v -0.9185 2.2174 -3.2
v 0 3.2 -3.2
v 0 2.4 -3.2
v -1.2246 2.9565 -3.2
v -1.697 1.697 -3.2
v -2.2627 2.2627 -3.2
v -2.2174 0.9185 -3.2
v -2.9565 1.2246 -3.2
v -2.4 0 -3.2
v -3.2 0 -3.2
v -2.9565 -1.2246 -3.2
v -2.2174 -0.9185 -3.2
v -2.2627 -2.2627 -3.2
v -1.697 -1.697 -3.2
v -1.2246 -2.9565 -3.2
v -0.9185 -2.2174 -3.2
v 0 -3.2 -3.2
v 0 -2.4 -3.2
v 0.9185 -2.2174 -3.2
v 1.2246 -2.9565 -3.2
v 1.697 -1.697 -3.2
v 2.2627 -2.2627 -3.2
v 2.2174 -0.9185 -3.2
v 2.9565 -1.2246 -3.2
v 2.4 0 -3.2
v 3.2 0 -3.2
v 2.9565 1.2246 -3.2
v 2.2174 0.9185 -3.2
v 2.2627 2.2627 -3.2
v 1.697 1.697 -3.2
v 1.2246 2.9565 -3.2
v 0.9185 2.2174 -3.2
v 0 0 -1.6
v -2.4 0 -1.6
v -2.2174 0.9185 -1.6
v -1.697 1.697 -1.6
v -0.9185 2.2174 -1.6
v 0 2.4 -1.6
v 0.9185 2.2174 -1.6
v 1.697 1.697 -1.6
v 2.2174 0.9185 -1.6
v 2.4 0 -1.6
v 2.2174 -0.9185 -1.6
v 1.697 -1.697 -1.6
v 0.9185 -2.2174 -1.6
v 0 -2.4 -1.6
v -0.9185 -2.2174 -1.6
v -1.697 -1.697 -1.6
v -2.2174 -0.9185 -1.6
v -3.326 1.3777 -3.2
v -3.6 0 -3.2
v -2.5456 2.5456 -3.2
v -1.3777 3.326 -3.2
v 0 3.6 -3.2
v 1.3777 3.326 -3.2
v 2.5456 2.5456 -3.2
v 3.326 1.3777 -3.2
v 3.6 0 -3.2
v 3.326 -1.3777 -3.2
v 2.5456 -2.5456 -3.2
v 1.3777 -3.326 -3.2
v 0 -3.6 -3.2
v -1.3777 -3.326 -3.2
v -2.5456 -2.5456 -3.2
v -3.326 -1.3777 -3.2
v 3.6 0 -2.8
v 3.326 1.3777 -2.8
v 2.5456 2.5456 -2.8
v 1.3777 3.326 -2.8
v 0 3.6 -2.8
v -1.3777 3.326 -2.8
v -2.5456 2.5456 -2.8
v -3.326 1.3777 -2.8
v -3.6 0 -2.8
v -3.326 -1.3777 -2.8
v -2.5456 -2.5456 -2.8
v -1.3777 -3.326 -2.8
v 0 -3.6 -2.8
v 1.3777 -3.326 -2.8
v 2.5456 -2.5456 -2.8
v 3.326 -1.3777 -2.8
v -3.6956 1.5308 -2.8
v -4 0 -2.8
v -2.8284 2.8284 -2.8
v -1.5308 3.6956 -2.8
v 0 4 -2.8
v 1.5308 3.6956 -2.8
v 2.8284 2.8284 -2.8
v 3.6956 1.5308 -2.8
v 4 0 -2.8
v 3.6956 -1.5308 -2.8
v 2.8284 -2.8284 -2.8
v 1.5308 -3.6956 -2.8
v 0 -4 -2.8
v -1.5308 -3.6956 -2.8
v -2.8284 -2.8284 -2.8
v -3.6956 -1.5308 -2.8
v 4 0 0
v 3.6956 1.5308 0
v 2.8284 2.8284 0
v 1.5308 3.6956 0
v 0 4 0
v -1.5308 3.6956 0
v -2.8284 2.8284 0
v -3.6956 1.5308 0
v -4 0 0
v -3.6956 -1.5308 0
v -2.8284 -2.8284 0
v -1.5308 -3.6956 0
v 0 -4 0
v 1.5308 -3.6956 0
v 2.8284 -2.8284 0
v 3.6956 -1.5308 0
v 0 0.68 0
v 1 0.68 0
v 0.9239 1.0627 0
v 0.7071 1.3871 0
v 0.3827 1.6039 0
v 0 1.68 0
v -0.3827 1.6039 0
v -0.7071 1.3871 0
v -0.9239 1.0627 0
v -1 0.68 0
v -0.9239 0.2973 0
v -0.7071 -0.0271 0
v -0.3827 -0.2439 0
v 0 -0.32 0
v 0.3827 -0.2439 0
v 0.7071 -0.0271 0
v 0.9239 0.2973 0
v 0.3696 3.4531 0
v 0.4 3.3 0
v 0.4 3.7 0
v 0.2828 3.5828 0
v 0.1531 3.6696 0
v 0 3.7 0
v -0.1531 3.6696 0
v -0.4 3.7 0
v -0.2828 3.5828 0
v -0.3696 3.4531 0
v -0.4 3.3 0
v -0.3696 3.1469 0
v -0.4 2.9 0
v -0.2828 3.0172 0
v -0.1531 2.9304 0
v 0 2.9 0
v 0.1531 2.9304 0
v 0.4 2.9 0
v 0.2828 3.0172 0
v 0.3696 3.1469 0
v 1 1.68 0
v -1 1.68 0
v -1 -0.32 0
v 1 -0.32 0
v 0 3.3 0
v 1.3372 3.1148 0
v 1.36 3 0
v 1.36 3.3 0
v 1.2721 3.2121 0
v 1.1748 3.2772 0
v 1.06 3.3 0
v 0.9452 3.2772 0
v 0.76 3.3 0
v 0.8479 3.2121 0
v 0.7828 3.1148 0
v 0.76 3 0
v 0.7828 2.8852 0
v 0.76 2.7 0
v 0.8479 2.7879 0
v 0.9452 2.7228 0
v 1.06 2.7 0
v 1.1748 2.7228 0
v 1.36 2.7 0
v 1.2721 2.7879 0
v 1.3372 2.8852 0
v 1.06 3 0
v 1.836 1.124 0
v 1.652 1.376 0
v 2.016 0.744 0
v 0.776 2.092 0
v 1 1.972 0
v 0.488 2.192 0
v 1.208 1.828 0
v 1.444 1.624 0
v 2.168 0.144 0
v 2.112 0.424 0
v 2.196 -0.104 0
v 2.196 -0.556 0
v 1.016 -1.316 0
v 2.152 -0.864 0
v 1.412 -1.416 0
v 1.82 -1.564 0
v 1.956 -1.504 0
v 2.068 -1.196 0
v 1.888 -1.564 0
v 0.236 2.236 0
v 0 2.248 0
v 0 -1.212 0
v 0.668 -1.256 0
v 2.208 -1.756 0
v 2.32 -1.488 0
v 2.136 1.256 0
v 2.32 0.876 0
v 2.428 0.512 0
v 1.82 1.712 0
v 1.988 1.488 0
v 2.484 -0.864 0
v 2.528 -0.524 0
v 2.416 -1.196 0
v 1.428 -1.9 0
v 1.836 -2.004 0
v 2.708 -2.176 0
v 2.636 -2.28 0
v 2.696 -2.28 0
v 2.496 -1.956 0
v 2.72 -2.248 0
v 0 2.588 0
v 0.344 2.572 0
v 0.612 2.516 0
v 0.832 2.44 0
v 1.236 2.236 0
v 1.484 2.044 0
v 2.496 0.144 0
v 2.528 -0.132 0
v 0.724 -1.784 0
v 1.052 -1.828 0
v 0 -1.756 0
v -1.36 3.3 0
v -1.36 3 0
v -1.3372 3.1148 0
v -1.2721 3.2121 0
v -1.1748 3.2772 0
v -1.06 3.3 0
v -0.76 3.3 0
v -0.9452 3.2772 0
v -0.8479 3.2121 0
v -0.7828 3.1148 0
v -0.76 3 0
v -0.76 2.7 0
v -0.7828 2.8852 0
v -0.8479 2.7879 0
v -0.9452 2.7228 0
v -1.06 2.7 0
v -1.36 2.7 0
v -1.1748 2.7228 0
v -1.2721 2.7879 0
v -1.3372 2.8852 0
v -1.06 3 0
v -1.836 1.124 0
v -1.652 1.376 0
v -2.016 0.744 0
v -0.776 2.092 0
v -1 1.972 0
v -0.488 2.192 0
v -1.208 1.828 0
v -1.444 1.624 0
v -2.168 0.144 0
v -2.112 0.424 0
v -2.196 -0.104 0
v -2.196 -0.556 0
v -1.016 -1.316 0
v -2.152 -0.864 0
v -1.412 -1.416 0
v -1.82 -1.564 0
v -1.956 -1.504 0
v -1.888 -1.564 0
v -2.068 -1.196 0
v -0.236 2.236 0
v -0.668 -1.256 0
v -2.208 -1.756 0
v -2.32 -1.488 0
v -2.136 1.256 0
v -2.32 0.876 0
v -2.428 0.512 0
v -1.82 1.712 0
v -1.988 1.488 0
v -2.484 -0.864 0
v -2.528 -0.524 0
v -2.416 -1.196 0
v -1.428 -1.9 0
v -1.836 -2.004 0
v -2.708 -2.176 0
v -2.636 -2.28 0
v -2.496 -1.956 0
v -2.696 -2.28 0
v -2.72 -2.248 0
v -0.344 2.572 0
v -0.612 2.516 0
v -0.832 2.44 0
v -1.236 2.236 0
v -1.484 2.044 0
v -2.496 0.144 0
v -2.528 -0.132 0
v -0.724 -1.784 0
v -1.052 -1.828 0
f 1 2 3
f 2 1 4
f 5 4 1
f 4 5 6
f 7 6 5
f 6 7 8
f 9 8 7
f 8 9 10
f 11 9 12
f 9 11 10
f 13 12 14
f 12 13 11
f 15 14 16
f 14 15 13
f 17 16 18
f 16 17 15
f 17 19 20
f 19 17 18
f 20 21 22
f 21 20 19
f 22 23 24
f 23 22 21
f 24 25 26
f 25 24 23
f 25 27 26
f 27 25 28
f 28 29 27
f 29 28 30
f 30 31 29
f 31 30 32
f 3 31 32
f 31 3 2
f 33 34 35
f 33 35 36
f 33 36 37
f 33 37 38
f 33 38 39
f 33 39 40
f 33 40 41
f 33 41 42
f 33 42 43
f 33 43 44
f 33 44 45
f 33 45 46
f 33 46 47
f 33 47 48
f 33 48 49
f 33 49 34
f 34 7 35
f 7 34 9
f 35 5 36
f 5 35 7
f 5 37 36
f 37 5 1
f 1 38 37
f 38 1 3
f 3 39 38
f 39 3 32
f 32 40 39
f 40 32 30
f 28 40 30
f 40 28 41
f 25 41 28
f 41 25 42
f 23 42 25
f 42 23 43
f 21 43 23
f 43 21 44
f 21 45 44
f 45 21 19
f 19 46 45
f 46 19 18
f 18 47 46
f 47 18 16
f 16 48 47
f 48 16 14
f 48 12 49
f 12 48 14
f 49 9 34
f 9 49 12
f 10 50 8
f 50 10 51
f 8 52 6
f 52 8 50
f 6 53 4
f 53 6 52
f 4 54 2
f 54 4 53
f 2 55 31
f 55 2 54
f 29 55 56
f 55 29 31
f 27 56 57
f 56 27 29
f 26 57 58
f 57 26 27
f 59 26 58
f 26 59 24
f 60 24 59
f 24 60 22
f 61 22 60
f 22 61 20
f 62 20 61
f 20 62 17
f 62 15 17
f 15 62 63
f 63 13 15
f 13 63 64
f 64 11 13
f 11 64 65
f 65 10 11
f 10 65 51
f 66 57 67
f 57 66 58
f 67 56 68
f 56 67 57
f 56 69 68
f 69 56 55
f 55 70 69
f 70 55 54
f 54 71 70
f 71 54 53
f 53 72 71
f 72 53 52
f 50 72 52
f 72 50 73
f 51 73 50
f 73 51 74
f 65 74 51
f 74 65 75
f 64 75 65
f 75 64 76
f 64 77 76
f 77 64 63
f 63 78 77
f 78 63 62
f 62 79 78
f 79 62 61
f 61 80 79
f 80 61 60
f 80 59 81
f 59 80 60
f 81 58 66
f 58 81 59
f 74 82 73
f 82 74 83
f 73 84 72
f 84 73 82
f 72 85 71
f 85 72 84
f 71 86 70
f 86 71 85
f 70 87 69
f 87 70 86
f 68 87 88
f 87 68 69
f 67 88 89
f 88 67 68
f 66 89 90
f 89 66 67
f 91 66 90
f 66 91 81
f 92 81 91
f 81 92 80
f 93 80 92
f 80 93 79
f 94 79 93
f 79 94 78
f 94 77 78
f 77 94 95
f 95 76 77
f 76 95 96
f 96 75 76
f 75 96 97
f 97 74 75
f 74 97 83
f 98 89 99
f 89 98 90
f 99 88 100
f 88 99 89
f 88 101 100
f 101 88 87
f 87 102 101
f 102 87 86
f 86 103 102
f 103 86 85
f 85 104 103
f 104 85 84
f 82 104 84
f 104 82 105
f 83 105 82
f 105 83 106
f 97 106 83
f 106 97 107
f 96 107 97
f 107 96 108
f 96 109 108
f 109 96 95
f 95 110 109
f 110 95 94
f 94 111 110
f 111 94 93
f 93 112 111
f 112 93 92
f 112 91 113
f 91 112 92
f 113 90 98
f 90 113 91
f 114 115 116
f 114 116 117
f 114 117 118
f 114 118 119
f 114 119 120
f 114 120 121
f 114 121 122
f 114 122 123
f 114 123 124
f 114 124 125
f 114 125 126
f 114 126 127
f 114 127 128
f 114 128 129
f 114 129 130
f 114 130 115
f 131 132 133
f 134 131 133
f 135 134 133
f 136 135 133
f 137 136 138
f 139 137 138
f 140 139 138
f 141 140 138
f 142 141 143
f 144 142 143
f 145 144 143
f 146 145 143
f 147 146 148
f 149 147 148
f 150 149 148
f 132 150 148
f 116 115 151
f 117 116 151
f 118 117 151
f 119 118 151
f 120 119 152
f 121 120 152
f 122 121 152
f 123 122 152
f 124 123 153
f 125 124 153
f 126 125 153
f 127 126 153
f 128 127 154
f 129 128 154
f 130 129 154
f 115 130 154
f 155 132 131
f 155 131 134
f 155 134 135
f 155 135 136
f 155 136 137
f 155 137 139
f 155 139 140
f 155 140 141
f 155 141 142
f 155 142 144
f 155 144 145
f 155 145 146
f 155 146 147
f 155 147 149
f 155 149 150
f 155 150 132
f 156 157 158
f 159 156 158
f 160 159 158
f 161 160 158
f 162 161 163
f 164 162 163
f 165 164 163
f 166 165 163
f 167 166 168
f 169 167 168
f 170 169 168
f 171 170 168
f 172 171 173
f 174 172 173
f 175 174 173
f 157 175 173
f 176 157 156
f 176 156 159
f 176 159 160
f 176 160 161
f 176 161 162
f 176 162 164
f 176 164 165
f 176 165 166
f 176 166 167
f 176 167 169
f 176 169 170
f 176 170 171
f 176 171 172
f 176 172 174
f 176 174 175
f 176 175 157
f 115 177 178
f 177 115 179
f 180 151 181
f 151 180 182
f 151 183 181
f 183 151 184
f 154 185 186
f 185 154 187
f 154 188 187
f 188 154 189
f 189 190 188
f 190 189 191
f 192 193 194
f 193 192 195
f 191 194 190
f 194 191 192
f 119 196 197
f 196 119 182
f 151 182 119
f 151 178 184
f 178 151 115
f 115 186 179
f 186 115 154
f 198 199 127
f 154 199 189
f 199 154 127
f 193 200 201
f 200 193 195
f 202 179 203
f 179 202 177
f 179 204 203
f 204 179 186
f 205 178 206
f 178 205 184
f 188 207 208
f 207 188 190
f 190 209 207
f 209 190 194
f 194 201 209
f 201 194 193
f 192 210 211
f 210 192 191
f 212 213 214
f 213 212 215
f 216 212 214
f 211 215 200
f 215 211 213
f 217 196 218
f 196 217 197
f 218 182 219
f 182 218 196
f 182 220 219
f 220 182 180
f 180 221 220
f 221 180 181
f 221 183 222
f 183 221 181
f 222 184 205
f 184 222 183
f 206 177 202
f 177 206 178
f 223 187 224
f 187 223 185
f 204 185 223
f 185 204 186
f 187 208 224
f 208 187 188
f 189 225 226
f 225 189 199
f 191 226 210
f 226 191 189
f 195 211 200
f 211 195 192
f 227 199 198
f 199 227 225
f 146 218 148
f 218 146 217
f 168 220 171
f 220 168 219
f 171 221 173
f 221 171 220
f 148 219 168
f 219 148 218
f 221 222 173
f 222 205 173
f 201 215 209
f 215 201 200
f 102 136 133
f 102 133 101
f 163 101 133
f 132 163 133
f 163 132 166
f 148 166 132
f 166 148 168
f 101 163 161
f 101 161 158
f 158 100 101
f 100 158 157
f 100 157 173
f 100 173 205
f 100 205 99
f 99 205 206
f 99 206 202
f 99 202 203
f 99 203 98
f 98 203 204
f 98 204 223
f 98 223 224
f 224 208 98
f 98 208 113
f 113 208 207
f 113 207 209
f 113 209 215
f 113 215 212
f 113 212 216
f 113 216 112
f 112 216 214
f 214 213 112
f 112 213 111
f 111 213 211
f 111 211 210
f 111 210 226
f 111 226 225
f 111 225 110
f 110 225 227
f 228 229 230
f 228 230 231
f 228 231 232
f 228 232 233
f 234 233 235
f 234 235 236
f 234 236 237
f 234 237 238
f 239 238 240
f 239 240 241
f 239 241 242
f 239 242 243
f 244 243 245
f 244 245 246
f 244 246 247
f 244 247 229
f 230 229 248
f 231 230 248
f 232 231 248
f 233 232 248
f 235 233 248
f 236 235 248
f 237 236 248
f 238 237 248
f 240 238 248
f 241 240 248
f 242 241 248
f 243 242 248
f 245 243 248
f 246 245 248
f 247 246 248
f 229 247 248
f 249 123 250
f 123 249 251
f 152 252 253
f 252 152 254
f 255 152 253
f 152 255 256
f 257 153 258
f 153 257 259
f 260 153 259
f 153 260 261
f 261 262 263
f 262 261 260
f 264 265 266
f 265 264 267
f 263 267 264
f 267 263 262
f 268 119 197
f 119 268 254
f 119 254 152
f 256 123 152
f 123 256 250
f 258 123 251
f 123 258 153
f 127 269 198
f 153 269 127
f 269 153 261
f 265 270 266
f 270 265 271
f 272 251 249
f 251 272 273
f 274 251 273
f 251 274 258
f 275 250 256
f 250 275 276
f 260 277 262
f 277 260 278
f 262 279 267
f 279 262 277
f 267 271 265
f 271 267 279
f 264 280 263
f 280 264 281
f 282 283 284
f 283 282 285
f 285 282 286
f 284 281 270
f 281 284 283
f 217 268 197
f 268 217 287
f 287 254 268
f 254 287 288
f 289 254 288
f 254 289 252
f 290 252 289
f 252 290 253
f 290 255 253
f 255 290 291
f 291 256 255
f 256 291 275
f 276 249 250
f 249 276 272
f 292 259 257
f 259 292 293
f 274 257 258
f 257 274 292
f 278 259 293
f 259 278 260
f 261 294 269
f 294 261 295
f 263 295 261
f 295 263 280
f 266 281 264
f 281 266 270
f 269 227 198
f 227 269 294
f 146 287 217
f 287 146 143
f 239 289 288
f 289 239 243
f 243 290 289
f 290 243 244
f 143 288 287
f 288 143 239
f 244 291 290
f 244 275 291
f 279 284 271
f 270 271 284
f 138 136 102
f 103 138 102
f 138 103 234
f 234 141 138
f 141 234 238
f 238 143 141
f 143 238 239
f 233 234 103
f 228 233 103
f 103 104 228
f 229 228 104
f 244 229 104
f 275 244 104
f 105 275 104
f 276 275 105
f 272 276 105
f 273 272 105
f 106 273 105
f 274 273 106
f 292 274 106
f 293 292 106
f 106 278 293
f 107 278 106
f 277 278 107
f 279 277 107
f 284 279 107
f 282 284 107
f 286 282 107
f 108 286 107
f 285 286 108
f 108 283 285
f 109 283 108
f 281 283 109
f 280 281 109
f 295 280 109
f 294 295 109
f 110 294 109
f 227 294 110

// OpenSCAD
// file: ../p/4-4ring3.scad
use <../lib.scad>
function ldraw_lib__4_4ring3() = [
// 0 Ring  3 x 1.0
// 0 Name: 4-4ring3.dat
// 0 Author: James Jessiman
// 0 !LDRAW_ORG Primitive UPDATE 2009-01
// 0 !LICENSE Licensed under CC BY 4.0 : see CAreadme.txt
// 
// 0 BFC CERTIFY CCW
  [0,"BFC","CERTIFY"],
  [0,"BFC","CCW"],
// 
// 0 !HISTORY 1998-12-15 [PTadmin] Official Update 1998-10
// 0 !HISTORY 2002-04-05 [hafhead] Added BFC statement
// 0 !HISTORY 2002-04-25 [PTadmin] Official Update 2002-02
// 0 !HISTORY 2007-06-24 [PTadmin] Header formatted for Contributor Agreement
// 0 !HISTORY 2008-07-01 [PTadmin] Official Update 2008-01
// 0 !HISTORY 2008-08-26 [cwdee] Switch polygon winding and rename
// 0 !HISTORY 2009-05-02 [PTadmin] Official Update 2009-01
// 
// 
// 4 16 -1.5308 0 3.6956 -1.1481 0 2.7717 0 0 3 0 0 4
  [4,16,-1.5308,0,3.6956,-1.1481,0,2.7717,0,0,3,0,0,4],
// 4 16 -2.8284 0 2.8284 -2.1213 0 2.1213 -1.1481 0 2.7717 -1.5308 0 3.6956
  [4,16,-2.8284,0,2.8284,-2.1213,0,2.1213,-1.1481,0,2.7717,-1.5308,0,3.6956],
// 4 16 -3.6956 0 1.5308 -2.7717 0 1.1481 -2.1213 0 2.1213 -2.8284 0 2.8284
  [4,16,-3.6956,0,1.5308,-2.7717,0,1.1481,-2.1213,0,2.1213,-2.8284,0,2.8284],
// 4 16 -4 0 0 -3 0 0 -2.7717 0 1.1481 -3.6956 0 1.5308
  [4,16,-4,0,0,-3,0,0,-2.7717,0,1.1481,-3.6956,0,1.5308],
// 4 16 -3.6956 0 -1.5308 -2.7717 0 -1.1481 -3 0 0 -4 0 0
  [4,16,-3.6956,0,-1.5308,-2.7717,0,-1.1481,-3,0,0,-4,0,0],
// 4 16 -2.8284 0 -2.8284 -2.1213 0 -2.1213 -2.7717 0 -1.1481 -3.6956 0 -1.5308
  [4,16,-2.8284,0,-2.8284,-2.1213,0,-2.1213,-2.7717,0,-1.1481,-3.6956,0,-1.5308],
// 4 16 -1.5308 0 -3.6956 -1.1481 0 -2.7717 -2.1213 0 -2.1213 -2.8284 0 -2.8284
  [4,16,-1.5308,0,-3.6956,-1.1481,0,-2.7717,-2.1213,0,-2.1213,-2.8284,0,-2.8284],
// 4 16 0 0 -4 0 0 -3 -1.1481 0 -2.7717 -1.5308 0 -3.6956
  [4,16,0,0,-4,0,0,-3,-1.1481,0,-2.7717,-1.5308,0,-3.6956],
// 4 16 1.5308 0 -3.6956 1.1481 0 -2.7717 0 0 -3 0 0 -4
  [4,16,1.5308,0,-3.6956,1.1481,0,-2.7717,0,0,-3,0,0,-4],
// 4 16 2.8284 0 -2.8284 2.1213 0 -2.1213 1.1481 0 -2.7717 1.5308 0 -3.6956
  [4,16,2.8284,0,-2.8284,2.1213,0,-2.1213,1.1481,0,-2.7717,1.5308,0,-3.6956],
// 4 16 3.6956 0 -1.5308 2.7717 0 -1.1481 2.1213 0 -2.1213 2.8284 0 -2.8284
  [4,16,3.6956,0,-1.5308,2.7717,0,-1.1481,2.1213,0,-2.1213,2.8284,0,-2.8284],
// 4 16 4 0 0 3 0 0 2.7717 0 -1.1481 3.6956 0 -1.5308
  [4,16,4,0,0,3,0,0,2.7717,0,-1.1481,3.6956,0,-1.5308],
// 4 16 3.6956 0 1.5308 2.7717 0 1.1481 3 0 0 4 0 0
  [4,16,3.6956,0,1.5308,2.7717,0,1.1481,3,0,0,4,0,0],
// 4 16 2.8284 0 2.8284 2.1213 0 2.1213 2.7717 0 1.1481 3.6956 0 1.5308
  [4,16,2.8284,0,2.8284,2.1213,0,2.1213,2.7717,0,1.1481,3.6956,0,1.5308],
// 4 16 1.5308 0 3.6956 1.1481 0 2.7717 2.1213 0 2.1213 2.8284 0 2.8284
  [4,16,1.5308,0,3.6956,1.1481,0,2.7717,2.1213,0,2.1213,2.8284,0,2.8284],
// 4 16 0 0 4 0 0 3 1.1481 0 2.7717 1.5308 0 3.6956
  [4,16,0,0,4,0,0,3,1.1481,0,2.7717,1.5308,0,3.6956],
// 0
];
module ldraw_lib__4_4ring3(step=0, col=false, unit=2/5, alt=false, line=0.2, solid=!$preview)
    makepoly(ldraw_lib__4_4ring3(), step=step, col=col, unit=unit, alt=alt, line=line, solid=solid);
ldraw_lib__4_4ring3(line=0.2);
// file: ../p/4-4cylc.scad
use <../lib.scad>
use <4-4cyli.scad>
use <4-4disc.scad>
use <4-4edge.scad>
function ldraw_lib__4_4cylc() = [
// 0 Cylinder Closed 1.0
// 0 Name: 4-4cylc.dat
// 0 Author: Alex Taylor [anathema]
// 0 !LDRAW_ORG Primitive UPDATE 2009-02
// 0 !LICENSE Licensed under CC BY 4.0 : see CAreadme.txt
// 
// 0 BFC CERTIFY CCW
  [0,"BFC","CERTIFY"],
  [0,"BFC","CCW"],
// 
// 0 !HISTORY 2008-12-29 [cwdee] Removed one disc
// 0 !HISTORY 2009-09-03 [PTadmin] Official Update 2009-02
// 
// 
// 1 16 0 0 0 1 0 0 0 1 0 0 0 1 4-4edge.dat
  [1,16,0,0,0,1,0,0,0,1,0,0,0,1, ldraw_lib__4_4edge()],
// 1 16 0 1 0 1 0 0 0 1 0 0 0 1 4-4edge.dat
  [1,16,0,1,0,1,0,0,0,1,0,0,0,1, ldraw_lib__4_4edge()],
// 1 16 0 0 0 1 0 0 0 1 0 0 0 1 4-4disc.dat
  [1,16,0,0,0,1,0,0,0,1,0,0,0,1, ldraw_lib__4_4disc()],
// 1 16 0 0 0 1 0 0 0 1 0 0 0 1 4-4cyli.dat
  [1,16,0,0,0,1,0,0,0,1,0,0,0,1, ldraw_lib__4_4cyli()],
// 0
];
module ldraw_lib__4_4cylc(step=0, col=false, unit=2/5, alt=false, line=0.2, solid=!$preview)
    makepoly(ldraw_lib__4_4cylc(), step=step, col=col, unit=unit, alt=alt, line=line, solid=solid);
ldraw_lib__4_4cylc(line=0.2);
// file: ../p/4-4edge.scad
use <../lib.scad>
function ldraw_lib__4_4edge() = [
// 0 Circle 1.0
// 0 Name: 4-4edge.dat
// 0 Author: James Jessiman
// 0 !LDRAW_ORG Primitive UPDATE 2017-01
// 0 !LICENSE Licensed under CC BY 4.0 : see CAreadme.txt
// 
// 0 BFC CERTIFY CCW
  [0,"BFC","CERTIFY"],
  [0,"BFC","CCW"],
// 
// 0 !HISTORY 1998-12-15 [PTadmin] Official Update 1998-10
// 0 !HISTORY 2005-12-28 [PTadmin] Official Update 2005-01
// 0 !HISTORY 2007-06-24 [PTadmin] Header formatted for Contributor Agreement
// 0 !HISTORY 2008-07-01 [PTadmin] Official Update 2008-01
// 0 !HISTORY 2017-01-15 [Steffen] BFCed
// 0 !HISTORY 2017-12-30 [PTadmin] Official Update 2017-01
// 
// 
// 2 24 1 0 0 0.9239 0 0.3827
  [2,24,1,0,0,0.9239,0,0.3827],
// 2 24 0.9239 0 0.3827 0.7071 0 0.7071
  [2,24,0.9239,0,0.3827,0.7071,0,0.7071],
// 2 24 0.7071 0 0.7071 0.3827 0 0.9239
  [2,24,0.7071,0,0.7071,0.3827,0,0.9239],
// 2 24 0.3827 0 0.9239 0 0 1
  [2,24,0.3827,0,0.9239,0,0,1],
// 2 24 0 0 1 -0.3827 0 0.9239
  [2,24,0,0,1,-0.3827,0,0.9239],
// 2 24 -0.3827 0 0.9239 -0.7071 0 0.7071
  [2,24,-0.3827,0,0.9239,-0.7071,0,0.7071],
// 2 24 -0.7071 0 0.7071 -0.9239 0 0.3827
  [2,24,-0.7071,0,0.7071,-0.9239,0,0.3827],
// 2 24 -0.9239 0 0.3827 -1 0 -0
  [2,24,-0.9239,0,0.3827,-1,0,-0],
// 2 24 -1 0 -0 -0.9239 0 -0.3827
  [2,24,-1,0,-0,-0.9239,0,-0.3827],
// 2 24 -0.9239 0 -0.3827 -0.7071 0 -0.7071
  [2,24,-0.9239,0,-0.3827,-0.7071,0,-0.7071],
// 2 24 -0.7071 0 -0.7071 -0.3827 0 -0.9239
  [2,24,-0.7071,0,-0.7071,-0.3827,0,-0.9239],
// 2 24 -0.3827 0 -0.9239 0 0 -1
  [2,24,-0.3827,0,-0.9239,0,0,-1],
// 2 24 0 0 -1 0.3827 0 -0.9239
  [2,24,0,0,-1,0.3827,0,-0.9239],
// 2 24 0.3827 0 -0.9239 0.7071 0 -0.7071
  [2,24,0.3827,0,-0.9239,0.7071,0,-0.7071],
// 2 24 0.7071 0 -0.7071 0.9239 0 -0.3827
  [2,24,0.7071,0,-0.7071,0.9239,0,-0.3827],
// 2 24 0.9239 0 -0.3827 1 0 0
  [2,24,0.9239,0,-0.3827,1,0,0],
];
module ldraw_lib__4_4edge(step=0, col=false, unit=2/5, alt=false, line=0.2, solid=!$preview)
    makepoly(ldraw_lib__4_4edge(), step=step, col=col, unit=unit, alt=alt, line=line, solid=solid);
ldraw_lib__4_4edge(line=0.2);
// file: ../p/4-4cyli.scad
use <../lib.scad>
function ldraw_lib__4_4cyli() = [
// 0 Cylinder 1.0
// 0 Name: 4-4cyli.dat
// 0 Author: James Jessiman
// 0 !LDRAW_ORG Primitive UPDATE 2005-01
// 0 !LICENSE Licensed under CC BY 4.0 : see CAreadme.txt
// 
// 0 BFC CERTIFY CCW
  [0,"BFC","CERTIFY"],
  [0,"BFC","CCW"],
// 
// 0 !HISTORY 1998-12-15 [PTadmin] Official Update 1998-10
// 0 !HISTORY 2002-03-23 [sbliss] Added BFC statement; merged headers from files in distributions LDraw 0.27 and Complete.
// 0 !HISTORY 2002-04-25 [PTadmin] Official Update 2002-02
// 0 !HISTORY 2004-12-14 [guyvivan] BFC CCW
// 0 !HISTORY 2005-12-28 [PTadmin] Official Update 2005-01
// 0 !HISTORY 2007-06-24 [PTadmin] Header formatted for Contributor Agreement
// 0 !HISTORY 2008-07-01 [PTadmin] Official Update 2008-01
// 
// 
// 4 16 1 1 0 0.9239 1 0.3827 0.9239 0 0.3827 1 0 0
  [4,16,1,1,0,0.9239,1,0.3827,0.9239,0,0.3827,1,0,0],
// 5 24 1 0 0 1 1 0 0.9239 0 0.3827 0.9239 0 -0.3827
  [5,24,1,0,0,1,1,0,0.9239,0,0.3827,0.9239,0,-0.3827],
// 4 16 0.9239 1 0.3827 0.7071 1 0.7071 0.7071 0 0.7071 0.9239 0 0.3827
  [4,16,0.9239,1,0.3827,0.7071,1,0.7071,0.7071,0,0.7071,0.9239,0,0.3827],
// 5 24 0.9239 0 0.3827 0.9239 1 0.3827 0.7071 0 0.7071 1 0 0
  [5,24,0.9239,0,0.3827,0.9239,1,0.3827,0.7071,0,0.7071,1,0,0],
// 4 16 0.7071 1 0.7071 0.3827 1 0.9239 0.3827 0 0.9239 0.7071 0 0.7071
  [4,16,0.7071,1,0.7071,0.3827,1,0.9239,0.3827,0,0.9239,0.7071,0,0.7071],
// 5 24 0.7071 0 0.7071 0.7071 1 0.7071 0.3827 0 0.9239 0.9239 0 0.3827
  [5,24,0.7071,0,0.7071,0.7071,1,0.7071,0.3827,0,0.9239,0.9239,0,0.3827],
// 4 16 0.3827 1 0.9239 0 1 1 0 0 1 0.3827 0 0.9239
  [4,16,0.3827,1,0.9239,0,1,1,0,0,1,0.3827,0,0.9239],
// 5 24 0.3827 0 0.9239 0.3827 1 0.9239 0 0 1 0.7071 0 0.7071
  [5,24,0.3827,0,0.9239,0.3827,1,0.9239,0,0,1,0.7071,0,0.7071],
// 4 16 0 1 1 -0.3827 1 0.9239 -0.3827 0 0.9239 0 0 1
  [4,16,0,1,1,-0.3827,1,0.9239,-0.3827,0,0.9239,0,0,1],
// 5 24 0 0 1 0 1 1 -0.3827 0 0.9239 0.3827 0 0.9239
  [5,24,0,0,1,0,1,1,-0.3827,0,0.9239,0.3827,0,0.9239],
// 4 16 -0.3827 1 0.9239 -0.7071 1 0.7071 -0.7071 0 0.7071 -0.3827 0 0.9239
  [4,16,-0.3827,1,0.9239,-0.7071,1,0.7071,-0.7071,0,0.7071,-0.3827,0,0.9239],
// 5 24 -0.3827 0 0.9239 -0.3827 1 0.9239 -0.7071 0 0.7071 0 0 1
  [5,24,-0.3827,0,0.9239,-0.3827,1,0.9239,-0.7071,0,0.7071,0,0,1],
// 4 16 -0.7071 1 0.7071 -0.9239 1 0.3827 -0.9239 0 0.3827 -0.7071 0 0.7071
  [4,16,-0.7071,1,0.7071,-0.9239,1,0.3827,-0.9239,0,0.3827,-0.7071,0,0.7071],
// 5 24 -0.7071 0 0.7071 -0.7071 1 0.7071 -0.9239 0 0.3827 -0.3827 0 0.9239
  [5,24,-0.7071,0,0.7071,-0.7071,1,0.7071,-0.9239,0,0.3827,-0.3827,0,0.9239],
// 4 16 -0.9239 1 0.3827 -1 1 0 -1 0 0 -0.9239 0 0.3827
  [4,16,-0.9239,1,0.3827,-1,1,0,-1,0,0,-0.9239,0,0.3827],
// 5 24 -0.9239 0 0.3827 -0.9239 1 0.3827 -1 0 0 -0.7071 0 0.7071
  [5,24,-0.9239,0,0.3827,-0.9239,1,0.3827,-1,0,0,-0.7071,0,0.7071],
// 4 16 -1 1 0 -0.9239 1 -0.3827 -0.9239 0 -0.3827 -1 0 0
  [4,16,-1,1,0,-0.9239,1,-0.3827,-0.9239,0,-0.3827,-1,0,0],
// 5 24 -1 0 0 -1 1 0 -0.9239 0 -0.3827 -0.9239 0 0.3827
  [5,24,-1,0,0,-1,1,0,-0.9239,0,-0.3827,-0.9239,0,0.3827],
// 4 16 -0.9239 1 -0.3827 -0.7071 1 -0.7071 -0.7071 0 -0.7071 -0.9239 0 -0.3827
  [4,16,-0.9239,1,-0.3827,-0.7071,1,-0.7071,-0.7071,0,-0.7071,-0.9239,0,-0.3827],
// 5 24 -0.9239 0 -0.3827 -0.9239 1 -0.3827 -0.7071 0 -0.7071 -1 0 0
  [5,24,-0.9239,0,-0.3827,-0.9239,1,-0.3827,-0.7071,0,-0.7071,-1,0,0],
// 4 16 -0.7071 1 -0.7071 -0.3827 1 -0.9239 -0.3827 0 -0.9239 -0.7071 0 -0.7071
  [4,16,-0.7071,1,-0.7071,-0.3827,1,-0.9239,-0.3827,0,-0.9239,-0.7071,0,-0.7071],
// 5 24 -0.7071 0 -0.7071 -0.7071 1 -0.7071 -0.3827 0 -0.9239 -0.9239 0 -0.3827
  [5,24,-0.7071,0,-0.7071,-0.7071,1,-0.7071,-0.3827,0,-0.9239,-0.9239,0,-0.3827],
// 4 16 -0.3827 1 -0.9239 0 1 -1 0 0 -1 -0.3827 0 -0.9239
  [4,16,-0.3827,1,-0.9239,0,1,-1,0,0,-1,-0.3827,0,-0.9239],
// 5 24 -0.3827 0 -0.9239 -0.3827 1 -0.9239 0 0 -1 -0.7071 0 -0.7071
  [5,24,-0.3827,0,-0.9239,-0.3827,1,-0.9239,0,0,-1,-0.7071,0,-0.7071],
// 4 16 0 1 -1 0.3827 1 -0.9239 0.3827 0 -0.9239 0 0 -1
  [4,16,0,1,-1,0.3827,1,-0.9239,0.3827,0,-0.9239,0,0,-1],
// 5 24 0 0 -1 0 1 -1 0.3827 0 -0.9239 -0.3827 0 -0.9239
  [5,24,0,0,-1,0,1,-1,0.3827,0,-0.9239,-0.3827,0,-0.9239],
// 4 16 0.3827 1 -0.9239 0.7071 1 -0.7071 0.7071 0 -0.7071 0.3827 0 -0.9239
  [4,16,0.3827,1,-0.9239,0.7071,1,-0.7071,0.7071,0,-0.7071,0.3827,0,-0.9239],
// 5 24 0.3827 0 -0.9239 0.3827 1 -0.9239 0.7071 0 -0.7071 0 0 -1
  [5,24,0.3827,0,-0.9239,0.3827,1,-0.9239,0.7071,0,-0.7071,0,0,-1],
// 4 16 0.7071 1 -0.7071 0.9239 1 -0.3827 0.9239 0 -0.3827 0.7071 0 -0.7071
  [4,16,0.7071,1,-0.7071,0.9239,1,-0.3827,0.9239,0,-0.3827,0.7071,0,-0.7071],
// 5 24 0.7071 0 -0.7071 0.7071 1 -0.7071 0.9239 0 -0.3827 0.3827 0 -0.9239
  [5,24,0.7071,0,-0.7071,0.7071,1,-0.7071,0.9239,0,-0.3827,0.3827,0,-0.9239],
// 4 16 0.9239 1 -0.3827 1 1 0 1 0 0 0.9239 0 -0.3827
  [4,16,0.9239,1,-0.3827,1,1,0,1,0,0,0.9239,0,-0.3827],
// 5 24 0.9239 0 -0.3827 0.9239 1 -0.3827 1 0 0 0.7071 0 -0.7071
  [5,24,0.9239,0,-0.3827,0.9239,1,-0.3827,1,0,0,0.7071,0,-0.7071],
// 0
];
module ldraw_lib__4_4cyli(step=0, col=false, unit=2/5, alt=false, line=0.2, solid=!$preview)
    makepoly(ldraw_lib__4_4cyli(), step=step, col=col, unit=unit, alt=alt, line=line, solid=solid);
ldraw_lib__4_4cyli(line=0.2);
// file: ../p/empty.scad
use <../lib.scad>
function ldraw_lib__empty() = [
// 0 Empty
// 0 Name: empty.dat
// 0 Author: Steffen [Steffen]
// 0 !LDRAW_ORG Primitive UPDATE 2015-01
// 0 !LICENSE Licensed under CC BY 4.0 : see CAreadme.txt
// 
// 0 BFC CERTIFY CCW
  [0,"BFC","CERTIFY"],
  [0,"BFC","CCW"],
// 
// 0 !HISTORY 2015-10-11 [PTadmin] Official Update 2015-01
// 
// 
// 0 // Tool MLCad cannot handle really empty files. This file is used as a workaround.
// 0 // It exceptionally contains forbidden non-LDRAW standard syntax to satisfy MLCad until it is fixed OR a different editor has become the de-facto LDRAW standard.
// 0 // The line being used here is an "impossible" conditional line which never should be visible,
// 0 // additionally hidden by a syntax explicitly hiding it from displaying.
// 
// 0 MLCAD HIDE 5 24 0 0 0 0.0001 0 0 0.0001 -0.0001 0 0 0 0
];
module ldraw_lib__empty(step=0, col=false, unit=2/5, alt=false, line=0.2, solid=!$preview)
    makepoly(ldraw_lib__empty(), step=step, col=col, unit=unit, alt=alt, line=line, solid=solid);
ldraw_lib__empty(line=0.2);
// file: ../p/stud4o.scad
use <../lib.scad>
use <4-4cylc.scad>
use <4-4ring3.scad>
function ldraw_lib__stud4o() = [
// 0 Stud Tube Open without Outer Cylinder
// 0 Name: stud4o.dat
// 0 Author: Magnus Forsberg [MagFors]
// 0 !LDRAW_ORG Primitive UPDATE 2011-02
// 0 !LICENSE Licensed under CC BY 4.0 : see CAreadme.txt
// 
// 0 !HELP This stud is a "antistud" to be used like a underside stud,
// 0 !HELP but without the outer cylinder.
// 0 !HELP 1 47 0 0 0 1 0 0 0 1 0 0 0 1 stud4.dat
// 
// 0 BFC CERTIFY CCW
  [0,"BFC","CERTIFY"],
  [0,"BFC","CCW"],
// 
// 0 !HISTORY 2011-12-29 [PTadmin] Official Update 2011-02
// 
// 
// 1 16 0 -4 0 2 0 0 0 1 0 0 0 2 4-4ring3.dat
  [1,16,0,-4,0,2,0,0,0,1,0,0,0,2, ldraw_lib__4_4ring3()],
// 0 BFC INVERTNEXT
  [0,"BFC","INVERTNEXT"],
// 1 16 0 0 0 -6 0 0 0 -4 0 0 0 6 4-4cylc.dat
  [1,16,0,0,0,-6,0,0,0,-4,0,0,0,6, ldraw_lib__4_4cylc()],
];
module ldraw_lib__stud4o(step=0, col=false, unit=2/5, alt=false, line=0.2, solid=!$preview)
    makepoly(ldraw_lib__stud4o(), step=step, col=col, unit=unit, alt=alt, line=line, solid=solid);
ldraw_lib__stud4o(line=0.2);
// file: ../p/4-4ring9.scad
use <../lib.scad>
function ldraw_lib__4_4ring9() = [
// 0 Ring  9 x 1.0
// 0 Name: 4-4ring9.dat
// 0 Author: Magnus Forsberg [MagFors]
// 0 !LDRAW_ORG Primitive UPDATE 2024-01
// 0 !LICENSE Licensed under CC BY 4.0 : see CAreadme.txt
// 
// 0 BFC CERTIFY CCW
  [0,"BFC","CERTIFY"],
  [0,"BFC","CCW"],
// 
// 0 !HISTORY 2004-04-22 [PTadmin] Official Update 2004-02
// 0 !HISTORY 2007-06-24 [PTadmin] Header formatted for Contributor Agreement
// 0 !HISTORY 2008-07-01 [PTadmin] Official Update 2008-01
// 0 !HISTORY 2024-01-04 [MagFors] Complete regeneration, original by jriley
// 0 !HISTORY 2024-01-29 [OrionP] Official Update 2024-01
// 
// 4 16 10 0 0 9.239 0 3.827 8.3151 0 3.4443 9 0 0
  [4,16,10,0,0,9.239,0,3.827,8.3151,0,3.4443,9,0,0],
// 4 16 9.239 0 3.827 7.071 0 7.071 6.3639 0 6.3639 8.3151 0 3.4443
  [4,16,9.239,0,3.827,7.071,0,7.071,6.3639,0,6.3639,8.3151,0,3.4443],
// 4 16 7.071 0 7.071 3.827 0 9.239 3.4443 0 8.3151 6.3639 0 6.3639
  [4,16,7.071,0,7.071,3.827,0,9.239,3.4443,0,8.3151,6.3639,0,6.3639],
// 4 16 3.827 0 9.239 0 0 10 0 0 9 3.4443 0 8.3151
  [4,16,3.827,0,9.239,0,0,10,0,0,9,3.4443,0,8.3151],
// 4 16 0 0 10 -3.827 0 9.239 -3.4443 0 8.3151 0 0 9
  [4,16,0,0,10,-3.827,0,9.239,-3.4443,0,8.3151,0,0,9],
// 4 16 -3.827 0 9.239 -7.071 0 7.071 -6.3639 0 6.3639 -3.4443 0 8.3151
  [4,16,-3.827,0,9.239,-7.071,0,7.071,-6.3639,0,6.3639,-3.4443,0,8.3151],
// 4 16 -7.071 0 7.071 -9.239 0 3.827 -8.3151 0 3.4443 -6.3639 0 6.3639
  [4,16,-7.071,0,7.071,-9.239,0,3.827,-8.3151,0,3.4443,-6.3639,0,6.3639],
// 4 16 -9.239 0 3.827 -10 0 0 -9 0 0 -8.3151 0 3.4443
  [4,16,-9.239,0,3.827,-10,0,0,-9,0,0,-8.3151,0,3.4443],
// 4 16 -10 0 0 -9.239 0 -3.827 -8.3151 0 -3.4443 -9 0 0
  [4,16,-10,0,0,-9.239,0,-3.827,-8.3151,0,-3.4443,-9,0,0],
// 4 16 -9.239 0 -3.827 -7.071 0 -7.071 -6.3639 0 -6.3639 -8.3151 0 -3.4443
  [4,16,-9.239,0,-3.827,-7.071,0,-7.071,-6.3639,0,-6.3639,-8.3151,0,-3.4443],
// 4 16 -7.071 0 -7.071 -3.827 0 -9.239 -3.4443 0 -8.3151 -6.3639 0 -6.3639
  [4,16,-7.071,0,-7.071,-3.827,0,-9.239,-3.4443,0,-8.3151,-6.3639,0,-6.3639],
// 4 16 -3.827 0 -9.239 0 0 -10 0 0 -9 -3.4443 0 -8.3151
  [4,16,-3.827,0,-9.239,0,0,-10,0,0,-9,-3.4443,0,-8.3151],
// 4 16 0 0 -10 3.827 0 -9.239 3.4443 0 -8.3151 0 0 -9
  [4,16,0,0,-10,3.827,0,-9.239,3.4443,0,-8.3151,0,0,-9],
// 4 16 3.827 0 -9.239 7.071 0 -7.071 6.3639 0 -6.3639 3.4443 0 -8.3151
  [4,16,3.827,0,-9.239,7.071,0,-7.071,6.3639,0,-6.3639,3.4443,0,-8.3151],
// 4 16 7.071 0 -7.071 9.239 0 -3.827 8.3151 0 -3.4443 6.3639 0 -6.3639
  [4,16,7.071,0,-7.071,9.239,0,-3.827,8.3151,0,-3.4443,6.3639,0,-6.3639],
// 4 16 9.239 0 -3.827 10 0 0 9 0 0 8.3151 0 -3.4443
  [4,16,9.239,0,-3.827,10,0,0,9,0,0,8.3151,0,-3.4443],
// 0 // Build by LDPartEditor (PrimGen 2.X)
];
module ldraw_lib__4_4ring9(step=0, col=false, unit=2/5, alt=false, line=0.2, solid=!$preview)
    makepoly(ldraw_lib__4_4ring9(), step=step, col=col, unit=unit, alt=alt, line=line, solid=solid);
ldraw_lib__4_4ring9(line=0.2);
// file: ../p/4-4ring8.scad
use <../lib.scad>
function ldraw_lib__4_4ring8() = [
// 0 Ring  8 x 1.0
// 0 Name: 4-4ring8.dat
// 0 Author: Steffen [Steffen]
// 0 !LDRAW_ORG Primitive UPDATE 2012-01
// 0 !LICENSE Licensed under CC BY 4.0 : see CAreadme.txt
// 
// 0 BFC CERTIFY CCW
  [0,"BFC","CERTIFY"],
  [0,"BFC","CCW"],
// 
// 0 !HISTORY 2003-12-19 [PTadmin] Official Update 2003-03
// 0 !HISTORY 2007-06-24 [PTadmin] Header formatted for Contributor Agreement
// 0 !HISTORY 2008-07-01 [PTadmin] Official Update 2008-01
// 0 !HISTORY 2012-02-16 [Philo] Changed to CCW
// 0 !HISTORY 2012-03-30 [PTadmin] Official Update 2012-01
// 
// 
// 4 16 9 0 0 8.3151 0 3.4443 7.3912 0 3.0616 8 0 0
  [4,16,9,0,0,8.3151,0,3.4443,7.3912,0,3.0616,8,0,0],
// 4 16 8.3151 0 3.4443 6.3639 0 6.3639 5.6568 0 5.6568 7.3912 0 3.0616
  [4,16,8.3151,0,3.4443,6.3639,0,6.3639,5.6568,0,5.6568,7.3912,0,3.0616],
// 4 16 6.3639 0 6.3639 3.4443 0 8.3151 3.0616 0 7.3912 5.6568 0 5.6568
  [4,16,6.3639,0,6.3639,3.4443,0,8.3151,3.0616,0,7.3912,5.6568,0,5.6568],
// 4 16 3.4443 0 8.3151 0 0 9 0 0 8 3.0616 0 7.3912
  [4,16,3.4443,0,8.3151,0,0,9,0,0,8,3.0616,0,7.3912],
// 4 16 0 0 9 -3.4443 0 8.3151 -3.0616 0 7.3912 0 0 8
  [4,16,0,0,9,-3.4443,0,8.3151,-3.0616,0,7.3912,0,0,8],
// 4 16 -3.4443 0 8.3151 -6.3639 0 6.3639 -5.6568 0 5.6568 -3.0616 0 7.3912
  [4,16,-3.4443,0,8.3151,-6.3639,0,6.3639,-5.6568,0,5.6568,-3.0616,0,7.3912],
// 4 16 -6.3639 0 6.3639 -8.3151 0 3.4443 -7.3912 0 3.0616 -5.6568 0 5.6568
  [4,16,-6.3639,0,6.3639,-8.3151,0,3.4443,-7.3912,0,3.0616,-5.6568,0,5.6568],
// 4 16 -8.3151 0 3.4443 -9 0 0 -8 0 0 -7.3912 0 3.0616
  [4,16,-8.3151,0,3.4443,-9,0,0,-8,0,0,-7.3912,0,3.0616],
// 4 16 -9 0 0 -8.3151 0 -3.4443 -7.3912 0 -3.0616 -8 0 0
  [4,16,-9,0,0,-8.3151,0,-3.4443,-7.3912,0,-3.0616,-8,0,0],
// 4 16 -8.3151 0 -3.4443 -6.3639 0 -6.3639 -5.6568 0 -5.6568 -7.3912 0 -3.0616
  [4,16,-8.3151,0,-3.4443,-6.3639,0,-6.3639,-5.6568,0,-5.6568,-7.3912,0,-3.0616],
// 4 16 -6.3639 0 -6.3639 -3.4443 0 -8.3151 -3.0616 0 -7.3912 -5.6568 0 -5.6568
  [4,16,-6.3639,0,-6.3639,-3.4443,0,-8.3151,-3.0616,0,-7.3912,-5.6568,0,-5.6568],
// 4 16 -3.4443 0 -8.3151 0 0 -9 0 0 -8 -3.0616 0 -7.3912
  [4,16,-3.4443,0,-8.3151,0,0,-9,0,0,-8,-3.0616,0,-7.3912],
// 4 16 0 0 -9 3.4443 0 -8.3151 3.0616 0 -7.3912 0 0 -8
  [4,16,0,0,-9,3.4443,0,-8.3151,3.0616,0,-7.3912,0,0,-8],
// 4 16 3.4443 0 -8.3151 6.3639 0 -6.3639 5.6568 0 -5.6568 3.0616 0 -7.3912
  [4,16,3.4443,0,-8.3151,6.3639,0,-6.3639,5.6568,0,-5.6568,3.0616,0,-7.3912],
// 4 16 6.3639 0 -6.3639 8.3151 0 -3.4443 7.3912 0 -3.0616 5.6568 0 -5.6568
  [4,16,6.3639,0,-6.3639,8.3151,0,-3.4443,7.3912,0,-3.0616,5.6568,0,-5.6568],
// 4 16 8.3151 0 -3.4443 9 0 0 8 0 0 7.3912 0 -3.0616
  [4,16,8.3151,0,-3.4443,9,0,0,8,0,0,7.3912,0,-3.0616],
];
module ldraw_lib__4_4ring8(step=0, col=false, unit=2/5, alt=false, line=0.2, solid=!$preview)
    makepoly(ldraw_lib__4_4ring8(), step=step, col=col, unit=unit, alt=alt, line=line, solid=solid);
ldraw_lib__4_4ring8(line=0.2);
// file: ../p/4-4cylo.scad
use <../lib.scad>
use <4-4cyli.scad>
use <4-4edge.scad>
function ldraw_lib__4_4cylo() = [
// 0 Cylinder Open 1.0
// 0 Name: 4-4cylo.dat
// 0 Author: Mark Kennedy [mkennedy]
// 0 !LDRAW_ORG Primitive UPDATE 2010-01
// 0 !LICENSE Licensed under CC BY 4.0 : see CAreadme.txt
// 
// 0 BFC CERTIFY CCW
  [0,"BFC","CERTIFY"],
  [0,"BFC","CCW"],
// 
// 0 !HISTORY 2010-04-05 [PTadmin] Official Update 2010-01
// 
// 
// 1 16 0 0 0 1 0 0 0 1 0 0 0 1 4-4edge.dat
  [1,16,0,0,0,1,0,0,0,1,0,0,0,1, ldraw_lib__4_4edge()],
// 1 16 0 1 0 1 0 0 0 1 0 0 0 1 4-4edge.dat
  [1,16,0,1,0,1,0,0,0,1,0,0,0,1, ldraw_lib__4_4edge()],
// 1 16 0 0 0 1 0 0 0 1 0 0 0 1 4-4cyli.dat
  [1,16,0,0,0,1,0,0,0,1,0,0,0,1, ldraw_lib__4_4cyli()],
// 0
];
module ldraw_lib__4_4cylo(step=0, col=false, unit=2/5, alt=false, line=0.2, solid=!$preview)
    makepoly(ldraw_lib__4_4cylo(), step=step, col=col, unit=unit, alt=alt, line=line, solid=solid);
ldraw_lib__4_4cylo(line=0.2);
// file: ../p/1-16chrd.scad
use <../lib.scad>
use <empty.scad>
function ldraw_lib__1_16chrd() = [
// 0 Chord 0.0625
// 0 Name: 1-16chrd.dat
// 0 Author: Philippe Hurbain [Philo]
// 0 !LDRAW_ORG Primitive UPDATE 2015-01
// 0 !LICENSE Licensed under CC BY 4.0 : see CAreadme.txt
// 
// 0 BFC CERTIFY CCW
  [0,"BFC","CERTIFY"],
  [0,"BFC","CCW"],
// 
// 0 !HISTORY 2015-10-11 [PTadmin] Official Update 2015-01
// 
// 
// 0 // This file is intentionally empty because at the current \P resolution,
// 0 // an 1-16chrd is actually empty. However, this file still is present
// 0 // to allow tools to do primitives substition and fill in a real chrd here,
// 0 // or, if desired, to substitute this with the hi-res 48\1-16chrd.
// 
// 0 // This file is based on an idea by Darats at http://forums.ldraw.org/read.php?19,14500,14500#msg-14500
// 
// 1 16 0 0 0 1 0 0 0 1 0 0 0 1 empty.dat
  [1,16,0,0,0,1,0,0,0,1,0,0,0,1, ldraw_lib__empty()],
];
module ldraw_lib__1_16chrd(step=0, col=false, unit=2/5, alt=false, line=0.2, solid=!$preview)
    makepoly(ldraw_lib__1_16chrd(), step=step, col=col, unit=unit, alt=alt, line=line, solid=solid);
ldraw_lib__1_16chrd(line=0.2);
// file: s/98138s02.scad
use <../../lib.scad>
use <../../p/4-4cylo.scad>
use <../../p/4-4ring8.scad>
use <../../p/4-4ring9.scad>
use <../../p/stud4o.scad>
function ldraw_lib__s__98138s02() = [
// 0 ~Tile  1 x  1 Round with Groove without Complete Top Face
// 0 Name: s\98138s02.dat
// 0 Author: Magnus Forsberg [MagFors]
// 0 !LDRAW_ORG Subpart UPDATE 2020-01
// 0 !LICENSE Licensed under CC BY 4.0 : see CAreadme.txt
// 
// 0 BFC CERTIFY CCW
  [0,"BFC","CERTIFY"],
  [0,"BFC","CCW"],
// 
// 0 !HISTORY 2020-06-28 [PTadmin] Official Update 2020-01
// 
// 
// 1 16 0 4 0 1 0 0 0 -1 0 0 0 1 stud4o.dat
  [1,16,0,4,0,1,0,0,0,-1,0,0,0,1, ldraw_lib__stud4o()],
// 1 16 0 8 0 -1 0 0 0 -1 0 0 0 1 4-4ring8.dat
  [1,16,0,8,0,-1,0,0,0,-1,0,0,0,1, ldraw_lib__4_4ring8()],
// 1 16 0 7 0 9 0 0 0 1 0 0 0 9 4-4cylo.dat
  [1,16,0,7,0,9,0,0,0,1,0,0,0,9, ldraw_lib__4_4cylo()],
// 1 16 0 7 0 -1 0 0 0 -1 0 0 0 1 4-4ring9.dat
  [1,16,0,7,0,-1,0,0,0,-1,0,0,0,1, ldraw_lib__4_4ring9()],
// 1 16 0 0 0 10 0 0 0 7 0 0 0 10 4-4cylo.dat
  [1,16,0,0,0,10,0,0,0,7,0,0,0,10, ldraw_lib__4_4cylo()],
];
module ldraw_lib__s__98138s02(step=0, col=false, unit=2/5, alt=false, line=0.2, solid=!$preview)
    makepoly(ldraw_lib__s__98138s02(), step=step, col=col, unit=unit, alt=alt, line=line, solid=solid);
ldraw_lib__s__98138s02(line=0.2);
// file: ../p/4-4ndis.scad
use <../lib.scad>
function ldraw_lib__4_4ndis() = [
// 0 Disc Negative 1.0
// 0 Name: 4-4ndis.dat
// 0 Author: James Jessiman
// 0 !LDRAW_ORG Primitive UPDATE 2012-01
// 0 !LICENSE Licensed under CC BY 4.0 : see CAreadme.txt
// 
// 0 BFC CERTIFY CCW
  [0,"BFC","CERTIFY"],
  [0,"BFC","CCW"],
// 
// 0 !HISTORY 2002-03-23 [sbliss] Added BFC statement; compacted code
// 0 !HISTORY 2002-04-25 [PTadmin] Official Update 2002-02
// 0 !HISTORY 2007-06-24 [PTadmin] Header formatted for Contributor Agreement
// 0 !HISTORY 2008-07-01 [PTadmin] Official Update 2008-01
// 0 !HISTORY 2012-02-16 [Philo] Changed to CCW
// 0 !HISTORY 2012-03-30 [PTadmin] Official Update 2012-01
// 
// 
// 3 16 0.9239 0 0.3827 1 0 0 1 0 1
  [3,16,0.9239,0,0.3827,1,0,0,1,0,1],
// 3 16 0.7071 0 0.7071 0.9239 0 0.3827 1 0 1
  [3,16,0.7071,0,0.7071,0.9239,0,0.3827,1,0,1],
// 3 16 0.3827 0 0.9239 0.7071 0 0.7071 1 0 1
  [3,16,0.3827,0,0.9239,0.7071,0,0.7071,1,0,1],
// 3 16 0 0 1 0.3827 0 0.9239 1 0 1
  [3,16,0,0,1,0.3827,0,0.9239,1,0,1],
// 3 16 -0.3827 0 0.9239 0 0 1 -1 0 1
  [3,16,-0.3827,0,0.9239,0,0,1,-1,0,1],
// 3 16 -0.7071 0 0.7071 -0.3827 0 0.9239 -1 0 1
  [3,16,-0.7071,0,0.7071,-0.3827,0,0.9239,-1,0,1],
// 3 16 -0.9239 0 0.3827 -0.7071 0 0.7071 -1 0 1
  [3,16,-0.9239,0,0.3827,-0.7071,0,0.7071,-1,0,1],
// 3 16 -1 0 0 -0.9239 0 0.3827 -1 0 1
  [3,16,-1,0,0,-0.9239,0,0.3827,-1,0,1],
// 3 16 -0.9239 0 -0.3827 -1 0 0 -1 0 -1
  [3,16,-0.9239,0,-0.3827,-1,0,0,-1,0,-1],
// 3 16 -0.7071 0 -0.7071 -0.9239 0 -0.3827 -1 0 -1
  [3,16,-0.7071,0,-0.7071,-0.9239,0,-0.3827,-1,0,-1],
// 3 16 -0.3827 0 -0.9239 -0.7071 0 -0.7071 -1 0 -1
  [3,16,-0.3827,0,-0.9239,-0.7071,0,-0.7071,-1,0,-1],
// 3 16 0 0 -1 -0.3827 0 -0.9239 -1 0 -1
  [3,16,0,0,-1,-0.3827,0,-0.9239,-1,0,-1],
// 3 16 0.3827 0 -0.9239 0 0 -1 1 0 -1
  [3,16,0.3827,0,-0.9239,0,0,-1,1,0,-1],
// 3 16 0.7071 0 -0.7071 0.3827 0 -0.9239 1 0 -1
  [3,16,0.7071,0,-0.7071,0.3827,0,-0.9239,1,0,-1],
// 3 16 0.9239 0 -0.3827 0.7071 0 -0.7071 1 0 -1
  [3,16,0.9239,0,-0.3827,0.7071,0,-0.7071,1,0,-1],
// 3 16 1 0 0 0.9239 0 -0.3827 1 0 -1
  [3,16,1,0,0,0.9239,0,-0.3827,1,0,-1],
];
module ldraw_lib__4_4ndis(step=0, col=false, unit=2/5, alt=false, line=0.2, solid=!$preview)
    makepoly(ldraw_lib__4_4ndis(), step=step, col=col, unit=unit, alt=alt, line=line, solid=solid);
ldraw_lib__4_4ndis(line=0.2);
// file: ../p/4-4ering.scad
use <../lib.scad>
use <1-16chrd.scad>
function ldraw_lib__4_4ering() = [
// 0 Adapter Ring Triangles to Normal 1.0
// 0 Name: 4-4ering.dat
// 0 Author: Philippe Hurbain [Philo]
// 0 !LDRAW_ORG Primitive UPDATE 2015-01
// 0 !LICENSE Licensed under CC BY 4.0 : see CAreadme.txt
// 
// 0 BFC CERTIFY CCW
  [0,"BFC","CERTIFY"],
  [0,"BFC","CCW"],
// 
// 0 !HISTORY 2015-10-11 [PTadmin] Official Update 2015-01
// 
// 
// 0 // This file uses 1-16chrd (actually empty). It allows
// 0 // tools to do primitives substition and fill in a ring of chrd here,
// 0 // or, if desired, to substitute this with the hi-res 48\1-16chrd.
// 0 // This file is based on an idea by Darats at http://forums.ldraw.org/read.php?19,14500,14500#msg-14500
// 
// 1 16 0 0 0 1 0 0 0 1 0 0 0 1 1-16chrd.dat
  [1,16,0,0,0,1,0,0,0,1,0,0,0,1, ldraw_lib__1_16chrd()],
// 1 16 0 0 0 0.92388 0 0.38268 0 1 0 -0.38268 0 0.92388 1-16chrd.dat
  [1,16,0,0,0,0.92388,0,0.38268,0,1,0,-0.38268,0,0.92388, ldraw_lib__1_16chrd()],
// 1 16 0 0 0 0.70711 0 0.70711 0 1 0 -0.70711 0 0.70711 1-16chrd.dat
  [1,16,0,0,0,0.70711,0,0.70711,0,1,0,-0.70711,0,0.70711, ldraw_lib__1_16chrd()],
// 1 16 0 0 0 0.38268 0 0.92388 0 1 0 -0.92388 0 0.38268 1-16chrd.dat
  [1,16,0,0,0,0.38268,0,0.92388,0,1,0,-0.92388,0,0.38268, ldraw_lib__1_16chrd()],
// 1 16 0 0 0 0 0 1 0 1 0 -1 0 0 1-16chrd.dat
  [1,16,0,0,0,0,0,1,0,1,0,-1,0,0, ldraw_lib__1_16chrd()],
// 1 16 0 0 0 -0.38268 0 0.92388 0 1 0 -0.92388 0 -0.38268 1-16chrd.dat
  [1,16,0,0,0,-0.38268,0,0.92388,0,1,0,-0.92388,0,-0.38268, ldraw_lib__1_16chrd()],
// 1 16 0 0 0 -0.70711 0 0.70711 0 1 0 -0.70711 0 -0.70711 1-16chrd.dat
  [1,16,0,0,0,-0.70711,0,0.70711,0,1,0,-0.70711,0,-0.70711, ldraw_lib__1_16chrd()],
// 1 16 0 0 0 -0.92388 0 0.38268 0 1 0 -0.38268 0 -0.92388 1-16chrd.dat
  [1,16,0,0,0,-0.92388,0,0.38268,0,1,0,-0.38268,0,-0.92388, ldraw_lib__1_16chrd()],
// 1 16 0 0 0 0 0 -1 0 1 0 1 0 0 1-16chrd.dat
  [1,16,0,0,0,0,0,-1,0,1,0,1,0,0, ldraw_lib__1_16chrd()],
// 1 16 0 0 0 0.38268 0 -0.92388 0 1 0 0.92388 0 0.38268 1-16chrd.dat
  [1,16,0,0,0,0.38268,0,-0.92388,0,1,0,0.92388,0,0.38268, ldraw_lib__1_16chrd()],
// 1 16 0 0 0 0.70711 0 -0.70711 0 1 0 0.70711 0 0.70711 1-16chrd.dat
  [1,16,0,0,0,0.70711,0,-0.70711,0,1,0,0.70711,0,0.70711, ldraw_lib__1_16chrd()],
// 1 16 0 0 0 0.92388 0 -0.38268 0 1 0 0.38268 0 0.92388 1-16chrd.dat
  [1,16,0,0,0,0.92388,0,-0.38268,0,1,0,0.38268,0,0.92388, ldraw_lib__1_16chrd()],
// 1 16 0 0 0 -1 0 0 0 1 0 0 0 -1 1-16chrd.dat
  [1,16,0,0,0,-1,0,0,0,1,0,0,0,-1, ldraw_lib__1_16chrd()],
// 1 16 0 0 0 -0.92388 0 -0.38268 0 1 0 0.38268 0 -0.92388 1-16chrd.dat
  [1,16,0,0,0,-0.92388,0,-0.38268,0,1,0,0.38268,0,-0.92388, ldraw_lib__1_16chrd()],
// 1 16 0 0 0 -0.70711 0 -0.70711 0 1 0 0.70711 0 -0.70711 1-16chrd.dat
  [1,16,0,0,0,-0.70711,0,-0.70711,0,1,0,0.70711,0,-0.70711, ldraw_lib__1_16chrd()],
// 1 16 0 0 0 -0.38268 0 -0.92388 0 1 0 0.92388 0 -0.38268 1-16chrd.dat
  [1,16,0,0,0,-0.38268,0,-0.92388,0,1,0,0.92388,0,-0.38268, ldraw_lib__1_16chrd()],
];
module ldraw_lib__4_4ering(step=0, col=false, unit=2/5, alt=false, line=0.2, solid=!$preview)
    makepoly(ldraw_lib__4_4ering(), step=step, col=col, unit=unit, alt=alt, line=line, solid=solid);
ldraw_lib__4_4ering(line=0.2);
// file: ../p/4-4disc.scad
use <../lib.scad>
function ldraw_lib__4_4disc() = [
// 0 Disc 1.0
// 0 Name: 4-4disc.dat
// 0 Author: James Jessiman
// 0 !LDRAW_ORG Primitive UPDATE 2002-02
// 0 !LICENSE Licensed under CC BY 4.0 : see CAreadme.txt
// 
// 0 BFC CERTIFY CCW
  [0,"BFC","CERTIFY"],
  [0,"BFC","CCW"],
// 
// 0 !HISTORY 1998-12-15 [PTadmin] Official Update 1998-10
// 0 !HISTORY 2002-03-23 [sbliss] Added BFC statement
// 0 !HISTORY 2002-04-25 [PTadmin] Official Update 2002-02
// 0 !HISTORY 2007-06-24 [PTadmin] Header formatted for Contributor Agreement
// 0 !HISTORY 2008-07-01 [PTadmin] Official Update 2008-01
// 
// 
// 3 16 0 0 0 1 0 0 0.9239 0 0.3827
  [3,16,0,0,0,1,0,0,0.9239,0,0.3827],
// 3 16 0 0 0 0.9239 0 0.3827 0.7071 0 0.7071
  [3,16,0,0,0,0.9239,0,0.3827,0.7071,0,0.7071],
// 3 16 0 0 0 0.7071 0 0.7071 0.3827 0 0.9239
  [3,16,0,0,0,0.7071,0,0.7071,0.3827,0,0.9239],
// 3 16 0 0 0 0.3827 0 0.9239 0 0 1
  [3,16,0,0,0,0.3827,0,0.9239,0,0,1],
// 3 16 0 0 0 0 0 1 -0.3827 0 0.9239
  [3,16,0,0,0,0,0,1,-0.3827,0,0.9239],
// 3 16 0 0 0 -0.3827 0 0.9239 -0.7071 0 0.7071
  [3,16,0,0,0,-0.3827,0,0.9239,-0.7071,0,0.7071],
// 3 16 0 0 0 -0.7071 0 0.7071 -0.9239 0 0.3827
  [3,16,0,0,0,-0.7071,0,0.7071,-0.9239,0,0.3827],
// 3 16 0 0 0 -0.9239 0 0.3827 -1 0 -0
  [3,16,0,0,0,-0.9239,0,0.3827,-1,0,-0],
// 3 16 0 0 0 -1 0 -0 -0.9239 0 -0.3827
  [3,16,0,0,0,-1,0,-0,-0.9239,0,-0.3827],
// 3 16 0 0 0 -0.9239 0 -0.3827 -0.7071 0 -0.7071
  [3,16,0,0,0,-0.9239,0,-0.3827,-0.7071,0,-0.7071],
// 3 16 0 0 0 -0.7071 0 -0.7071 -0.3827 0 -0.9239
  [3,16,0,0,0,-0.7071,0,-0.7071,-0.3827,0,-0.9239],
// 3 16 0 0 0 -0.3827 0 -0.9239 0 0 -1
  [3,16,0,0,0,-0.3827,0,-0.9239,0,0,-1],
// 3 16 0 0 0 0 0 -1 0.3827 0 -0.9239
  [3,16,0,0,0,0,0,-1,0.3827,0,-0.9239],
// 3 16 0 0 0 0.3827 0 -0.9239 0.7071 0 -0.7071
  [3,16,0,0,0,0.3827,0,-0.9239,0.7071,0,-0.7071],
// 3 16 0 0 0 0.7071 0 -0.7071 0.9239 0 -0.3827
  [3,16,0,0,0,0.7071,0,-0.7071,0.9239,0,-0.3827],
// 3 16 0 0 0 0.9239 0 -0.3827 1 0 0
  [3,16,0,0,0,0.9239,0,-0.3827,1,0,0],
// 0
];
module ldraw_lib__4_4disc(step=0, col=false, unit=2/5, alt=false, line=0.2, solid=!$preview)
    makepoly(ldraw_lib__4_4disc(), step=step, col=col, unit=unit, alt=alt, line=line, solid=solid);
ldraw_lib__4_4disc(line=0.2);
// main file
use <../lib.scad>
use <../p/4-4disc.scad>
use <../p/4-4ering.scad>
use <../p/4-4ndis.scad>
use <s/98138p2zs01.scad>
use <s/98138s02.scad>
function ldraw_lib__98138p2z() = [
// 0 Tile  1 x  1 Round with Three Red Dots and Red Eye Pattern
// 0 Name: 98138p2z.dat
// 0 Author: Vincent Messenet [Cheenzo]
// 0 !LDRAW_ORG Part UPDATE 2024-06
// 0 !LICENSE Licensed under CC BY 4.0 : see CAreadme.txt
// 
// 0 BFC CERTIFY CCW
  [0,"BFC","CERTIFY"],
  [0,"BFC","CCW"],
// 
// 0 !KEYWORDS Bricklink 98138pb358, Set 80111
// 
// 0 !HISTORY 2024-07-29 [OrionP] Official Update 2024-06
// 
// 1 16 0 0 0 1 0 0 0 1 0 0 0 1 s\98138s02.dat
  [1,16,0,0,0,1,0,0,0,1,0,0,0,1, ldraw_lib__s__98138s02()],
// 1 16 0 0 0 10 0 0 0 1 0 0 0 10 4-4ering.dat
  [1,16,0,0,0,10,0,0,0,1,0,0,0,10, ldraw_lib__4_4ering()],
// 1 16 0 0 1.7 2.5 0 0 0 1 0 0 0 2.5 4-4disc.dat
  [1,16,0,0,1.7,2.5,0,0,0,1,0,0,0,2.5, ldraw_lib__4_4disc()],
// 1 16 0 0 8.25 1 0 0 0 1 0 0 0 1 4-4ndis.dat
  [1,16,0,0,8.25,1,0,0,0,1,0,0,0,1, ldraw_lib__4_4ndis()],
// 1 4 0 0 1.7 2.5 0 0 0 1 0 0 0 2.5 4-4ndis.dat
  [1,4,0,0,1.7,2.5,0,0,0,1,0,0,0,2.5, ldraw_lib__4_4ndis()],
// 1 4 0 0 8.25 1 0 0 0 1 0 0 0 1 4-4disc.dat
  [1,4,0,0,8.25,1,0,0,0,1,0,0,0,1, ldraw_lib__4_4disc()],
// 1 16 0 0 0 1 0 0 0 1 0 0 0 1 s\98138p2zs01.dat
  [1,16,0,0,0,1,0,0,0,1,0,0,0,1, ldraw_lib__s__98138p2zs01()],
// 1 16 0 0 0 -1 0 0 0 1 0 0 0 1 s\98138p2zs01.dat
  [1,16,0,0,0,-1,0,0,0,1,0,0,0,1, ldraw_lib__s__98138p2zs01()],
];
module ldraw_lib__98138p2z(step=0, col=false, unit=2/5, alt=false, line=0.2, solid=!$preview)
    makepoly(ldraw_lib__98138p2z(), step=step, col=col, unit=unit, alt=alt, line=line, solid=solid);
ldraw_lib__98138p2z(line=0.2);
